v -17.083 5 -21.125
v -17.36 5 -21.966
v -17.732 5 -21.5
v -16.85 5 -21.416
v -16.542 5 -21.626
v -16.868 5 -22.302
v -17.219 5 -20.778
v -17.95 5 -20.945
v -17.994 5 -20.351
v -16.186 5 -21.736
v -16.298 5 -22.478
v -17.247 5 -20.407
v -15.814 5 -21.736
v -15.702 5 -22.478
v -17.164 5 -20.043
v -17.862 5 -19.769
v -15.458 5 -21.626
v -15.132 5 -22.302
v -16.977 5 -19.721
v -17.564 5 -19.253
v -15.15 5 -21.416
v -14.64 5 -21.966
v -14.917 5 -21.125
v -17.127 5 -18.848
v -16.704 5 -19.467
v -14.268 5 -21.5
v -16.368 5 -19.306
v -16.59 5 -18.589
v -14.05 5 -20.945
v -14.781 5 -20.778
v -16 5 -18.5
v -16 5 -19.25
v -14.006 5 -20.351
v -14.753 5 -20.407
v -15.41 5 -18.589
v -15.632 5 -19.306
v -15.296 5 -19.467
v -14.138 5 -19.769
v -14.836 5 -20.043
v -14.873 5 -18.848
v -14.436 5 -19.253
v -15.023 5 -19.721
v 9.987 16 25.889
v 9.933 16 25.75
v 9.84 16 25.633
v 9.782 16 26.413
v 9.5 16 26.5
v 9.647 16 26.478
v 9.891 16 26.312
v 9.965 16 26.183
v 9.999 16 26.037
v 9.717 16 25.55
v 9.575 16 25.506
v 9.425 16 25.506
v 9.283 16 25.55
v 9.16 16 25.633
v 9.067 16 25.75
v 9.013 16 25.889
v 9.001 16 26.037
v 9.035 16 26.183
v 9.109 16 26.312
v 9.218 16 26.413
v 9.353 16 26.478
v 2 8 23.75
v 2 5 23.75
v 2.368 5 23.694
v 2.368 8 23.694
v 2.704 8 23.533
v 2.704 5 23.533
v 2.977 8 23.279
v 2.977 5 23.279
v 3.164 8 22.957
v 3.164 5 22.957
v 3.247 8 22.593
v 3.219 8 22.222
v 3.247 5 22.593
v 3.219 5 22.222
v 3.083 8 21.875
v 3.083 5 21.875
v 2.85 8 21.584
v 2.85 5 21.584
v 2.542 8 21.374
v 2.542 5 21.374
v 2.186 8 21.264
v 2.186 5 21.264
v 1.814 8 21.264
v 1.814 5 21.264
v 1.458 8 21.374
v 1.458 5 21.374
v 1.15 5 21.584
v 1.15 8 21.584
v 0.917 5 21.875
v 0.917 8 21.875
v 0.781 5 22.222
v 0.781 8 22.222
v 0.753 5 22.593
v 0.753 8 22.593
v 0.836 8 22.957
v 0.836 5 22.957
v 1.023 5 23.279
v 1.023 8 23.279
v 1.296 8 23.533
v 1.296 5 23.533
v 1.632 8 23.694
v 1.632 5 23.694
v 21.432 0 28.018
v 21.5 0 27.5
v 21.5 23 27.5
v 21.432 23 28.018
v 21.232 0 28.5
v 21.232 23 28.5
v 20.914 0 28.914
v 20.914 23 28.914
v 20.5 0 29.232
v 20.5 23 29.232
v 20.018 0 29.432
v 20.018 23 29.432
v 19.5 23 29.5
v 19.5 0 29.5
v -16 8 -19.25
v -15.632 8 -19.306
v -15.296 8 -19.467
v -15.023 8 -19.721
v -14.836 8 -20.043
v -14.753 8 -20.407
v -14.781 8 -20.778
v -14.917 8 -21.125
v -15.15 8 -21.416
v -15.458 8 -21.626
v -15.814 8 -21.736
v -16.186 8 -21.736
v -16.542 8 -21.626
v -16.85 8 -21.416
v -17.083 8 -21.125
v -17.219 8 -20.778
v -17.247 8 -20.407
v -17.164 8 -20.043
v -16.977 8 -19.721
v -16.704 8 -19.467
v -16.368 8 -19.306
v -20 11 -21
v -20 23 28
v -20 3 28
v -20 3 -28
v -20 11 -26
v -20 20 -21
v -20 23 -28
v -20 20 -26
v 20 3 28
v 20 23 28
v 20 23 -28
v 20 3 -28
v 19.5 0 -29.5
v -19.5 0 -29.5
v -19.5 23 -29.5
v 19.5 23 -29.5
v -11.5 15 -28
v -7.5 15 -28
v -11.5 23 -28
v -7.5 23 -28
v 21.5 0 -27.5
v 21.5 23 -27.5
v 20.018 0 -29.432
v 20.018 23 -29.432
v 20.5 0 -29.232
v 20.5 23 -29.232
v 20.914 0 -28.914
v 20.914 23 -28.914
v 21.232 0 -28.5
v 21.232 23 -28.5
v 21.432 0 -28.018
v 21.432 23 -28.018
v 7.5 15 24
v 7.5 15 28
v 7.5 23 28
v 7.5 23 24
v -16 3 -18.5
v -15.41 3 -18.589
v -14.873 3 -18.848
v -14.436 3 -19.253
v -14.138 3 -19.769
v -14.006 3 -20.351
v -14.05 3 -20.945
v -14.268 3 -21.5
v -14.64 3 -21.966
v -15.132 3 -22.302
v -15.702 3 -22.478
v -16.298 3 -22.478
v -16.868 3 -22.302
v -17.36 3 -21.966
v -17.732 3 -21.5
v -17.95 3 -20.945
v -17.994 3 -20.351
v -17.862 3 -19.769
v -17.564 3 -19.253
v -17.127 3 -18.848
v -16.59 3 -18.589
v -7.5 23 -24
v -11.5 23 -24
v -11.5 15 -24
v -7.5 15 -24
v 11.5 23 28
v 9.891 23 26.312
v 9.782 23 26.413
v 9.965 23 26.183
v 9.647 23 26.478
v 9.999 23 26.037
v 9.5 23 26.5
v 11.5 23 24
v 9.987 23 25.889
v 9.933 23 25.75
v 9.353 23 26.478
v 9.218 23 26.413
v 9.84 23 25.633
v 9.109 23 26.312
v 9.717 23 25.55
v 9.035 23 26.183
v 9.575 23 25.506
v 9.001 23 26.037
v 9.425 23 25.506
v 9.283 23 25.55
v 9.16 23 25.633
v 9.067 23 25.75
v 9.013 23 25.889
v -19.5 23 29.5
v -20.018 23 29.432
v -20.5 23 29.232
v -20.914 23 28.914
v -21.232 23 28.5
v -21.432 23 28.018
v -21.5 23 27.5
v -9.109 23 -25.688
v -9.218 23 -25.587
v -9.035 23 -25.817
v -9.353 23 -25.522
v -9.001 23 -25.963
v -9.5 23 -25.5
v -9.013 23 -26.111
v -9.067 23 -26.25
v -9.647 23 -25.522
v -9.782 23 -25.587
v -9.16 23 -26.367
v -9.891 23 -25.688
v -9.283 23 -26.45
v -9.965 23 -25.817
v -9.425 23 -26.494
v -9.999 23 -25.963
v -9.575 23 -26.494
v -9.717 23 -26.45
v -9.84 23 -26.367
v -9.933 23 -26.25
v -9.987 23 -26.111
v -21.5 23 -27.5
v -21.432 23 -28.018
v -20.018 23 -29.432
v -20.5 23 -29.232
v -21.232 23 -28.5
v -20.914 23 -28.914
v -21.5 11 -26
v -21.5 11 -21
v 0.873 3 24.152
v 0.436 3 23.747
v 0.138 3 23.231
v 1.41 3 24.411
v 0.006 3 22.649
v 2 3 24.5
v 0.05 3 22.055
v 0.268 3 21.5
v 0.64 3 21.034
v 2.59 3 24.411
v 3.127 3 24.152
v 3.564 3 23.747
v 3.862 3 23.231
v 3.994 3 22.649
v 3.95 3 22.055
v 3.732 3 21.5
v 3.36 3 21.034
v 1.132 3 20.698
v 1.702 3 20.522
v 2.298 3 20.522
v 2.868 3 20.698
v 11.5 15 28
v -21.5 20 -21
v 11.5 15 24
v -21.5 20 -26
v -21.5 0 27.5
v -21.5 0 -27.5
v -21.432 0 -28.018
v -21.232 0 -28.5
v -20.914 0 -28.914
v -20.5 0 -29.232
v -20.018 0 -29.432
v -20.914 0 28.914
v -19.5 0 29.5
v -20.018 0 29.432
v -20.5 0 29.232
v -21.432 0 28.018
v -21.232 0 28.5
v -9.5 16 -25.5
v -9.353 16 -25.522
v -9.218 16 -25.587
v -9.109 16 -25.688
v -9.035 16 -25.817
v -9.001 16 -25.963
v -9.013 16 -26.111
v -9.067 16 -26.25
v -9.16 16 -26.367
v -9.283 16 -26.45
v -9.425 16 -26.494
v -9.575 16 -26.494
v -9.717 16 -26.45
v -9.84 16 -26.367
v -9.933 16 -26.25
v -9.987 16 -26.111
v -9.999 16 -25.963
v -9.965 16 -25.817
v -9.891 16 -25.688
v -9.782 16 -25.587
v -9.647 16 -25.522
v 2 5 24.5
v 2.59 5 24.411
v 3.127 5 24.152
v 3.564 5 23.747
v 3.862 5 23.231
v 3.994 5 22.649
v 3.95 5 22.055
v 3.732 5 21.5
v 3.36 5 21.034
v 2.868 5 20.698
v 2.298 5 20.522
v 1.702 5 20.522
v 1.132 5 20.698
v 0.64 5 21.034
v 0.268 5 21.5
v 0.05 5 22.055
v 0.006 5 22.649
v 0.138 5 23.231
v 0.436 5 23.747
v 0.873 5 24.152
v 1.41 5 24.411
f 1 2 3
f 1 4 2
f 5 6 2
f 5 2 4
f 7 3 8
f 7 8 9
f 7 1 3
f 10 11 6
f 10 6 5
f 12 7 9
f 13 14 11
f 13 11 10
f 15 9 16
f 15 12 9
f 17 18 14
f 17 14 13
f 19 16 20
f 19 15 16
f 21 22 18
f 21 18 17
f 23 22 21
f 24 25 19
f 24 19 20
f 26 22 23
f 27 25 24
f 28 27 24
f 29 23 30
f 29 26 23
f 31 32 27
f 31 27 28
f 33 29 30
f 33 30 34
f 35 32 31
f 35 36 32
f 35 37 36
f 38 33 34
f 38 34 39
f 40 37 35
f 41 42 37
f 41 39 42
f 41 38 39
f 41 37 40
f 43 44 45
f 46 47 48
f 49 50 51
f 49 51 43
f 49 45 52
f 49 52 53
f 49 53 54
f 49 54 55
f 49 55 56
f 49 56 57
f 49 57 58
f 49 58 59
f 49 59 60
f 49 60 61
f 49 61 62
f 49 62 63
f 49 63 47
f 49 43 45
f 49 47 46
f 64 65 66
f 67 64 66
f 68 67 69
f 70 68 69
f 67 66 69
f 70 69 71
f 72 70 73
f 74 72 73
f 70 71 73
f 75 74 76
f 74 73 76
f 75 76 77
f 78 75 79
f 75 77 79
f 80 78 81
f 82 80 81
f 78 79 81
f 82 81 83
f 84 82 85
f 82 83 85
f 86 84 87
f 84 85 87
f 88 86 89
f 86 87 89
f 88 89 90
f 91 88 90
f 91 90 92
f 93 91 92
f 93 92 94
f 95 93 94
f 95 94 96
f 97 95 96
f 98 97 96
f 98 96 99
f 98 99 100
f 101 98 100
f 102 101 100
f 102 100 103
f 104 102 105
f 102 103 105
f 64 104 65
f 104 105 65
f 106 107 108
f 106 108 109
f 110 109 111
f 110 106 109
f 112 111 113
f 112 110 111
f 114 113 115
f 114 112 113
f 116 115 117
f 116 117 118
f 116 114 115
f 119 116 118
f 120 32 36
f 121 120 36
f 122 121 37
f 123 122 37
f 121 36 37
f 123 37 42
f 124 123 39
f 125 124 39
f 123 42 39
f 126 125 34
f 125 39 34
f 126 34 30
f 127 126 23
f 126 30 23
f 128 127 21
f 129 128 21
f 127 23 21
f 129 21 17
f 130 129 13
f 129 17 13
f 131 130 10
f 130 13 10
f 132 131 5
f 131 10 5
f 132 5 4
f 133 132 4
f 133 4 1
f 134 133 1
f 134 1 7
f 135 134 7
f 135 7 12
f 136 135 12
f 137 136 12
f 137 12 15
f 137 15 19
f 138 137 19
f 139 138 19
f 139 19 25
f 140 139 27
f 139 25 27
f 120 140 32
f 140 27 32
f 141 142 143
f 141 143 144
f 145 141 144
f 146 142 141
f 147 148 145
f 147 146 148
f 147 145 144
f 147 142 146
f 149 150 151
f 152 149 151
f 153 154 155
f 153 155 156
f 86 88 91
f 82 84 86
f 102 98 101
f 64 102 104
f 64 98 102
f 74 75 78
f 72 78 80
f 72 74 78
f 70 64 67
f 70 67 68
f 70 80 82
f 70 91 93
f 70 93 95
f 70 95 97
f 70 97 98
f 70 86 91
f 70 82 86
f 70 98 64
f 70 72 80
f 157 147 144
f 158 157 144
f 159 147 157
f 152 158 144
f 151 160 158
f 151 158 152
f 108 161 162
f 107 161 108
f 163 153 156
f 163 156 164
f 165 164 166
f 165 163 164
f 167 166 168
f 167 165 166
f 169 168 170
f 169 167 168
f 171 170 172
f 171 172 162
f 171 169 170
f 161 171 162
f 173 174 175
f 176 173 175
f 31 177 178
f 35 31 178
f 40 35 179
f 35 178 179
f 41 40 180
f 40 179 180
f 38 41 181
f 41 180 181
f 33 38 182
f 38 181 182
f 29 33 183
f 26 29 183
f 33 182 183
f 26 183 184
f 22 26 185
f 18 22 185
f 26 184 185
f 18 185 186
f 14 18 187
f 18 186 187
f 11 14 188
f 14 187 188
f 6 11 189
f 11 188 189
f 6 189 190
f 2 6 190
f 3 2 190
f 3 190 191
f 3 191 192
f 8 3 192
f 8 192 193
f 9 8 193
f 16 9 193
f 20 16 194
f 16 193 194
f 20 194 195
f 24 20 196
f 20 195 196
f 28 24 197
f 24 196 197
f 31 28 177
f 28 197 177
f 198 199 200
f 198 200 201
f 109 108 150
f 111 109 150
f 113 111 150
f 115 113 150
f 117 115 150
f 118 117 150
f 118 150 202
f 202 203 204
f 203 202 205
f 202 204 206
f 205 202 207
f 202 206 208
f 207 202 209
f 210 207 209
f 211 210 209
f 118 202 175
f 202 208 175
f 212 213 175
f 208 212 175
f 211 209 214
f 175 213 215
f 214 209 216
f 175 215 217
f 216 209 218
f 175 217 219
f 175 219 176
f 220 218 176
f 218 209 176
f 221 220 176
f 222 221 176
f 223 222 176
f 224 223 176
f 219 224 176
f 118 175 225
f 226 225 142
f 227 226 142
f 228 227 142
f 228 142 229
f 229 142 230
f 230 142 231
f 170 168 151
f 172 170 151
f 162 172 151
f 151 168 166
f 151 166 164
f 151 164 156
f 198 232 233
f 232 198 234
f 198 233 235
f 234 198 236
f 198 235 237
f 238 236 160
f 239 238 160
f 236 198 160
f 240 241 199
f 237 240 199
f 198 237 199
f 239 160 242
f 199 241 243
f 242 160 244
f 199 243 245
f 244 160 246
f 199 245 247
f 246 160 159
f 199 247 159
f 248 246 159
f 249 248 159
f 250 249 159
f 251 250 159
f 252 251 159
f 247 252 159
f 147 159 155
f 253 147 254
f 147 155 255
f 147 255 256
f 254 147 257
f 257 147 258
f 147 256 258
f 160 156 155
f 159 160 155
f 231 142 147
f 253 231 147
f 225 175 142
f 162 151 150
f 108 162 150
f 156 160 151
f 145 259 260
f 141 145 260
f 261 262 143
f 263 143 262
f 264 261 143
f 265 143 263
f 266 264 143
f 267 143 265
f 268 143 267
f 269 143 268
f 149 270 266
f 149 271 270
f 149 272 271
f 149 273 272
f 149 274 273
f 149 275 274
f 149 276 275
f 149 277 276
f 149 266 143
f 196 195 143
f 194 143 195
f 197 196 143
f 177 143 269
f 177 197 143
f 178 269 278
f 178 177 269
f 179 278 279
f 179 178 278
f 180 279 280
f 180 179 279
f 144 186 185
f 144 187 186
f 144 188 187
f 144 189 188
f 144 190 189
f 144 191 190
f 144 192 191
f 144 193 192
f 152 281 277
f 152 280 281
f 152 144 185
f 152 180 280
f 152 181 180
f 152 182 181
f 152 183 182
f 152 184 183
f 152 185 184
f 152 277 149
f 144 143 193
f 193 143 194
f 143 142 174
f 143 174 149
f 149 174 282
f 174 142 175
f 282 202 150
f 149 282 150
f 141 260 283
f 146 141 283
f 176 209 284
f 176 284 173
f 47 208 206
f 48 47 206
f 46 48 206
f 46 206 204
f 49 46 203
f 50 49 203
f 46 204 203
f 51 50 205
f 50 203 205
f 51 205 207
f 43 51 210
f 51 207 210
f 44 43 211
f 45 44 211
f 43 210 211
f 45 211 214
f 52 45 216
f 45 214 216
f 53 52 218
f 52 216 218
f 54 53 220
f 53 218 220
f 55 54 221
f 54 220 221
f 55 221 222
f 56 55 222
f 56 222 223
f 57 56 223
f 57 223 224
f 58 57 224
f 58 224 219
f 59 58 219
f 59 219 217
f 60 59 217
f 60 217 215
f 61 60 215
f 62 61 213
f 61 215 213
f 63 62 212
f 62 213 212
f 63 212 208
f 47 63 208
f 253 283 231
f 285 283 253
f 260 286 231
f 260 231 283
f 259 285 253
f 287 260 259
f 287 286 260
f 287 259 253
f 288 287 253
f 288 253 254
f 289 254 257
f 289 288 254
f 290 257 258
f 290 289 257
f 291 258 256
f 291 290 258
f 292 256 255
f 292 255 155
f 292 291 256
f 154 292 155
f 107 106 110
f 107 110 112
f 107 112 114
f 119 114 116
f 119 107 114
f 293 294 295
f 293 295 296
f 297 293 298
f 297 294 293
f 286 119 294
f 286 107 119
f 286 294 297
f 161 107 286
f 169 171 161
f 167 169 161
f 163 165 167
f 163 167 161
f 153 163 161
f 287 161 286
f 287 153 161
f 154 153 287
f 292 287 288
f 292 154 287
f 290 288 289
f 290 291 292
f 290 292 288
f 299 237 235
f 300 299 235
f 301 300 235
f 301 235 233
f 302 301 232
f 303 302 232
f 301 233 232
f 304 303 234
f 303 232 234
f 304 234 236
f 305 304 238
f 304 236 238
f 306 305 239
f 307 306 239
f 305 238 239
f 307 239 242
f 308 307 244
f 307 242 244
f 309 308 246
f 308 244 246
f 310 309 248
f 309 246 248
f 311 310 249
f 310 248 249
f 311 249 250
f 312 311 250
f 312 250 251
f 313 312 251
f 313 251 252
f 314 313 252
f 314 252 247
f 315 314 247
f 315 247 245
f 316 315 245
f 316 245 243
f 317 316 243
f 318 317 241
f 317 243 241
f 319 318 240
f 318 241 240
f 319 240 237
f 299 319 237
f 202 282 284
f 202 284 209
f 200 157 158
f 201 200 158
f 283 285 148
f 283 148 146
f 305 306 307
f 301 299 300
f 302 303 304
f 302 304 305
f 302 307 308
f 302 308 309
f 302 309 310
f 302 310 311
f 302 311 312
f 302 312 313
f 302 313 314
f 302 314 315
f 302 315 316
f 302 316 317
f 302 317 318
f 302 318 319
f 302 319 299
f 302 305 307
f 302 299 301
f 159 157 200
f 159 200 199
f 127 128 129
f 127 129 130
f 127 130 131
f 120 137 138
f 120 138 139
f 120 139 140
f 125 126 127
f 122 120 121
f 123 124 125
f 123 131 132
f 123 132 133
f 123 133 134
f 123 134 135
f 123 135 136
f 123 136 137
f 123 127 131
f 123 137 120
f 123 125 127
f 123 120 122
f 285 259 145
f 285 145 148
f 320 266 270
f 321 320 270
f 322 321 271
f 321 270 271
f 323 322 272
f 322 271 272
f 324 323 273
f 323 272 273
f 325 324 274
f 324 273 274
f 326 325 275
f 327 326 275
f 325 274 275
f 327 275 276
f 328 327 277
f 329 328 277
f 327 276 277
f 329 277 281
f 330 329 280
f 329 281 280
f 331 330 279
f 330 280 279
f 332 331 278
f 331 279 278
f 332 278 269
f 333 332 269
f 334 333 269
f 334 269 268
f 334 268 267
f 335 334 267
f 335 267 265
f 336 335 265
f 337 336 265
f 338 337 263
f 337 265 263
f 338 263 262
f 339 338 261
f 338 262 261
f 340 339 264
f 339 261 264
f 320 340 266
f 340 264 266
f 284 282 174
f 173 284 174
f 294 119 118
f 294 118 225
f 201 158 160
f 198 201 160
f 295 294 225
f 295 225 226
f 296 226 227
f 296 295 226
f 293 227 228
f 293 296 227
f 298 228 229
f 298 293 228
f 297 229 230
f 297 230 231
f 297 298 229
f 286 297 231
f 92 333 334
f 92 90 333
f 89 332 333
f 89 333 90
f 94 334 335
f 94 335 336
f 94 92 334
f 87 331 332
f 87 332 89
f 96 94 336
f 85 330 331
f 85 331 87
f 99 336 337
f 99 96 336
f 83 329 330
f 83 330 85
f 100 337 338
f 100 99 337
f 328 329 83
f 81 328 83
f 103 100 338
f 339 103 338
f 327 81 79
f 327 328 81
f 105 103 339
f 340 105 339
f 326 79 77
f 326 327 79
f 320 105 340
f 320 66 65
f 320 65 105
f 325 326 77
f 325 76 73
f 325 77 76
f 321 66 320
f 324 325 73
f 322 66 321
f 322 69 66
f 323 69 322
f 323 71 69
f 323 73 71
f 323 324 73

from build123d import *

# Parameters (mm, degrees)
SALIENTE_EXTRUIR1_DEPTH = 23
CROQUIS2_W              = 40
CROQUIS2_H              = 56
CORTAR_EXTRUIR1_DEPTH   = 20
CROQUIS3_R              = 2
SALIENTE_EXTRUIR2_DEPTH = 2
CROQUIS4_R              = 1.25
SALIENTE_EXTRUIR3_DEPTH = 3
CROQUIS5_W              = 4
CROQUIS5_H              = 8
SALIENTE_EXTRUIR4_DEPTH = 4
CROQUIS6_W              = 4
CROQUIS6_H              = 8
SALIENTE_EXTRUIR5_DEPTH = 4
CROQUIS7_R              = 0.5
CORTAR_EXTRUIR2_DEPTH   = 7
CORTAR_EXTRUIR3_REACH   = 58.993
CROQUIS9_W              = 5
CROQUIS9_H              = 9


with BuildPart() as part:
    # Croquis1 → Saliente-Extruir1 (new body)
    with BuildSketch(Plane(origin=(0, 0, 0), x_dir=(1, 0, 0), z_dir=(0, 1, 0))):
        with BuildLine():
            Line((-19.5, 29.5), (19.5, 29.5))
            ThreePointArc((19.5, 29.5), (20.914213562, 28.914213562), (21.5, 27.5))
            Line((21.5, 27.5), (21.5, -27.5))
            ThreePointArc((21.5, -27.5), (20.914213562, -28.914213562), (19.5, -29.5))
            Line((19.5, -29.5), (-19.5, -29.5))
            ThreePointArc((-19.5, -29.5), (-20.914213562, -28.914213562), (-21.5, -27.5))
            Line((-21.5, -27.5), (-21.5, 27.5))
            ThreePointArc((-21.5, 27.5), (-20.914213562, 28.914213562), (-19.5, 29.5))
        make_face()
    extrude(amount=SALIENTE_EXTRUIR1_DEPTH)

    # Croquis2 → Cortar-Extruir1 (cut)
    with BuildSketch(Plane(origin=(0, 23, 0), x_dir=(1, 0, 0), z_dir=(0, 1, 0))):
        Rectangle(CROQUIS2_W, CROQUIS2_H)
    extrude(amount=-CORTAR_EXTRUIR1_DEPTH, mode=Mode.SUBTRACT)

    # Croquis3 → Saliente-Extruir2 (add)
    with BuildSketch(Plane(origin=(0, 3, 0), x_dir=(1, 0, 0), z_dir=(0, 1, 0))):
        with Locations(Location((-16, 20.5, 0), (0, 0, 270))):
            Circle(CROQUIS3_R)
        with Locations(Location((2, -22.5, 0), (0, 0, 270))):
            Circle(CROQUIS3_R)
    extrude(amount=SALIENTE_EXTRUIR2_DEPTH)

    # Croquis4 → Saliente-Extruir3 (add)
    with BuildSketch(Plane(origin=(0, 5, 0), x_dir=(1, 0, 0), z_dir=(0, 1, 0))):
        with Locations(Location((-16, 20.5, 0), (0, 0, 270))):
            Circle(CROQUIS4_R)
        with Locations(Location((2, -22.5, 0), (0, 0, 270))):
            Circle(CROQUIS4_R)
    extrude(amount=SALIENTE_EXTRUIR3_DEPTH)

    # Croquis5 → Saliente-Extruir4 (add)
    with BuildSketch(Plane.XY.offset(-28)):
        with Locations((-9.5, 19)):
            Rectangle(CROQUIS5_W, CROQUIS5_H)
    extrude(amount=SALIENTE_EXTRUIR4_DEPTH)

    # Croquis6 → Saliente-Extruir5 (add)
    with BuildSketch(Plane(origin=(0, 0, 28), x_dir=(-1, 0, 0), z_dir=(0, 0, -1))):
        with Locations((-9.5, 19)):
            Rectangle(CROQUIS6_W, CROQUIS6_H)
    extrude(amount=SALIENTE_EXTRUIR5_DEPTH)

    # Croquis7 → Cortar-Extruir2 (cut)
    with BuildSketch(Plane(origin=(0, 23, 0), x_dir=(1, 0, 0), z_dir=(0, 1, 0))):
        with Locations(Location((-9.5, 26, 0), (0, 0, 270))):
            Circle(CROQUIS7_R)
        with Locations(Location((9.5, -26, 0), (0, 0, 270))):
            Circle(CROQUIS7_R)
    extrude(amount=-CORTAR_EXTRUIR2_DEPTH, mode=Mode.SUBTRACT)

    # Croquis9 → Cortar-Extruir3 (cut, up to next)
    with BuildSketch(Plane.ZY.offset(21.5), mode=Mode.PRIVATE) as cortar_extruir3_sk1:
        with Locations((-23.5, 15.5)):
            Rectangle(CROQUIS9_W, CROQUIS9_H)
    cortar_extruir3_tool1 = extrude(cortar_extruir3_sk1.sketch, amount=-CORTAR_EXTRUIR3_REACH, mode=Mode.PRIVATE) & part.part
    add(cortar_extruir3_tool1.solids().sort_by_distance((-21.5, 15.5, -23.5))[0], mode=Mode.SUBTRACT)


solid = part.part
